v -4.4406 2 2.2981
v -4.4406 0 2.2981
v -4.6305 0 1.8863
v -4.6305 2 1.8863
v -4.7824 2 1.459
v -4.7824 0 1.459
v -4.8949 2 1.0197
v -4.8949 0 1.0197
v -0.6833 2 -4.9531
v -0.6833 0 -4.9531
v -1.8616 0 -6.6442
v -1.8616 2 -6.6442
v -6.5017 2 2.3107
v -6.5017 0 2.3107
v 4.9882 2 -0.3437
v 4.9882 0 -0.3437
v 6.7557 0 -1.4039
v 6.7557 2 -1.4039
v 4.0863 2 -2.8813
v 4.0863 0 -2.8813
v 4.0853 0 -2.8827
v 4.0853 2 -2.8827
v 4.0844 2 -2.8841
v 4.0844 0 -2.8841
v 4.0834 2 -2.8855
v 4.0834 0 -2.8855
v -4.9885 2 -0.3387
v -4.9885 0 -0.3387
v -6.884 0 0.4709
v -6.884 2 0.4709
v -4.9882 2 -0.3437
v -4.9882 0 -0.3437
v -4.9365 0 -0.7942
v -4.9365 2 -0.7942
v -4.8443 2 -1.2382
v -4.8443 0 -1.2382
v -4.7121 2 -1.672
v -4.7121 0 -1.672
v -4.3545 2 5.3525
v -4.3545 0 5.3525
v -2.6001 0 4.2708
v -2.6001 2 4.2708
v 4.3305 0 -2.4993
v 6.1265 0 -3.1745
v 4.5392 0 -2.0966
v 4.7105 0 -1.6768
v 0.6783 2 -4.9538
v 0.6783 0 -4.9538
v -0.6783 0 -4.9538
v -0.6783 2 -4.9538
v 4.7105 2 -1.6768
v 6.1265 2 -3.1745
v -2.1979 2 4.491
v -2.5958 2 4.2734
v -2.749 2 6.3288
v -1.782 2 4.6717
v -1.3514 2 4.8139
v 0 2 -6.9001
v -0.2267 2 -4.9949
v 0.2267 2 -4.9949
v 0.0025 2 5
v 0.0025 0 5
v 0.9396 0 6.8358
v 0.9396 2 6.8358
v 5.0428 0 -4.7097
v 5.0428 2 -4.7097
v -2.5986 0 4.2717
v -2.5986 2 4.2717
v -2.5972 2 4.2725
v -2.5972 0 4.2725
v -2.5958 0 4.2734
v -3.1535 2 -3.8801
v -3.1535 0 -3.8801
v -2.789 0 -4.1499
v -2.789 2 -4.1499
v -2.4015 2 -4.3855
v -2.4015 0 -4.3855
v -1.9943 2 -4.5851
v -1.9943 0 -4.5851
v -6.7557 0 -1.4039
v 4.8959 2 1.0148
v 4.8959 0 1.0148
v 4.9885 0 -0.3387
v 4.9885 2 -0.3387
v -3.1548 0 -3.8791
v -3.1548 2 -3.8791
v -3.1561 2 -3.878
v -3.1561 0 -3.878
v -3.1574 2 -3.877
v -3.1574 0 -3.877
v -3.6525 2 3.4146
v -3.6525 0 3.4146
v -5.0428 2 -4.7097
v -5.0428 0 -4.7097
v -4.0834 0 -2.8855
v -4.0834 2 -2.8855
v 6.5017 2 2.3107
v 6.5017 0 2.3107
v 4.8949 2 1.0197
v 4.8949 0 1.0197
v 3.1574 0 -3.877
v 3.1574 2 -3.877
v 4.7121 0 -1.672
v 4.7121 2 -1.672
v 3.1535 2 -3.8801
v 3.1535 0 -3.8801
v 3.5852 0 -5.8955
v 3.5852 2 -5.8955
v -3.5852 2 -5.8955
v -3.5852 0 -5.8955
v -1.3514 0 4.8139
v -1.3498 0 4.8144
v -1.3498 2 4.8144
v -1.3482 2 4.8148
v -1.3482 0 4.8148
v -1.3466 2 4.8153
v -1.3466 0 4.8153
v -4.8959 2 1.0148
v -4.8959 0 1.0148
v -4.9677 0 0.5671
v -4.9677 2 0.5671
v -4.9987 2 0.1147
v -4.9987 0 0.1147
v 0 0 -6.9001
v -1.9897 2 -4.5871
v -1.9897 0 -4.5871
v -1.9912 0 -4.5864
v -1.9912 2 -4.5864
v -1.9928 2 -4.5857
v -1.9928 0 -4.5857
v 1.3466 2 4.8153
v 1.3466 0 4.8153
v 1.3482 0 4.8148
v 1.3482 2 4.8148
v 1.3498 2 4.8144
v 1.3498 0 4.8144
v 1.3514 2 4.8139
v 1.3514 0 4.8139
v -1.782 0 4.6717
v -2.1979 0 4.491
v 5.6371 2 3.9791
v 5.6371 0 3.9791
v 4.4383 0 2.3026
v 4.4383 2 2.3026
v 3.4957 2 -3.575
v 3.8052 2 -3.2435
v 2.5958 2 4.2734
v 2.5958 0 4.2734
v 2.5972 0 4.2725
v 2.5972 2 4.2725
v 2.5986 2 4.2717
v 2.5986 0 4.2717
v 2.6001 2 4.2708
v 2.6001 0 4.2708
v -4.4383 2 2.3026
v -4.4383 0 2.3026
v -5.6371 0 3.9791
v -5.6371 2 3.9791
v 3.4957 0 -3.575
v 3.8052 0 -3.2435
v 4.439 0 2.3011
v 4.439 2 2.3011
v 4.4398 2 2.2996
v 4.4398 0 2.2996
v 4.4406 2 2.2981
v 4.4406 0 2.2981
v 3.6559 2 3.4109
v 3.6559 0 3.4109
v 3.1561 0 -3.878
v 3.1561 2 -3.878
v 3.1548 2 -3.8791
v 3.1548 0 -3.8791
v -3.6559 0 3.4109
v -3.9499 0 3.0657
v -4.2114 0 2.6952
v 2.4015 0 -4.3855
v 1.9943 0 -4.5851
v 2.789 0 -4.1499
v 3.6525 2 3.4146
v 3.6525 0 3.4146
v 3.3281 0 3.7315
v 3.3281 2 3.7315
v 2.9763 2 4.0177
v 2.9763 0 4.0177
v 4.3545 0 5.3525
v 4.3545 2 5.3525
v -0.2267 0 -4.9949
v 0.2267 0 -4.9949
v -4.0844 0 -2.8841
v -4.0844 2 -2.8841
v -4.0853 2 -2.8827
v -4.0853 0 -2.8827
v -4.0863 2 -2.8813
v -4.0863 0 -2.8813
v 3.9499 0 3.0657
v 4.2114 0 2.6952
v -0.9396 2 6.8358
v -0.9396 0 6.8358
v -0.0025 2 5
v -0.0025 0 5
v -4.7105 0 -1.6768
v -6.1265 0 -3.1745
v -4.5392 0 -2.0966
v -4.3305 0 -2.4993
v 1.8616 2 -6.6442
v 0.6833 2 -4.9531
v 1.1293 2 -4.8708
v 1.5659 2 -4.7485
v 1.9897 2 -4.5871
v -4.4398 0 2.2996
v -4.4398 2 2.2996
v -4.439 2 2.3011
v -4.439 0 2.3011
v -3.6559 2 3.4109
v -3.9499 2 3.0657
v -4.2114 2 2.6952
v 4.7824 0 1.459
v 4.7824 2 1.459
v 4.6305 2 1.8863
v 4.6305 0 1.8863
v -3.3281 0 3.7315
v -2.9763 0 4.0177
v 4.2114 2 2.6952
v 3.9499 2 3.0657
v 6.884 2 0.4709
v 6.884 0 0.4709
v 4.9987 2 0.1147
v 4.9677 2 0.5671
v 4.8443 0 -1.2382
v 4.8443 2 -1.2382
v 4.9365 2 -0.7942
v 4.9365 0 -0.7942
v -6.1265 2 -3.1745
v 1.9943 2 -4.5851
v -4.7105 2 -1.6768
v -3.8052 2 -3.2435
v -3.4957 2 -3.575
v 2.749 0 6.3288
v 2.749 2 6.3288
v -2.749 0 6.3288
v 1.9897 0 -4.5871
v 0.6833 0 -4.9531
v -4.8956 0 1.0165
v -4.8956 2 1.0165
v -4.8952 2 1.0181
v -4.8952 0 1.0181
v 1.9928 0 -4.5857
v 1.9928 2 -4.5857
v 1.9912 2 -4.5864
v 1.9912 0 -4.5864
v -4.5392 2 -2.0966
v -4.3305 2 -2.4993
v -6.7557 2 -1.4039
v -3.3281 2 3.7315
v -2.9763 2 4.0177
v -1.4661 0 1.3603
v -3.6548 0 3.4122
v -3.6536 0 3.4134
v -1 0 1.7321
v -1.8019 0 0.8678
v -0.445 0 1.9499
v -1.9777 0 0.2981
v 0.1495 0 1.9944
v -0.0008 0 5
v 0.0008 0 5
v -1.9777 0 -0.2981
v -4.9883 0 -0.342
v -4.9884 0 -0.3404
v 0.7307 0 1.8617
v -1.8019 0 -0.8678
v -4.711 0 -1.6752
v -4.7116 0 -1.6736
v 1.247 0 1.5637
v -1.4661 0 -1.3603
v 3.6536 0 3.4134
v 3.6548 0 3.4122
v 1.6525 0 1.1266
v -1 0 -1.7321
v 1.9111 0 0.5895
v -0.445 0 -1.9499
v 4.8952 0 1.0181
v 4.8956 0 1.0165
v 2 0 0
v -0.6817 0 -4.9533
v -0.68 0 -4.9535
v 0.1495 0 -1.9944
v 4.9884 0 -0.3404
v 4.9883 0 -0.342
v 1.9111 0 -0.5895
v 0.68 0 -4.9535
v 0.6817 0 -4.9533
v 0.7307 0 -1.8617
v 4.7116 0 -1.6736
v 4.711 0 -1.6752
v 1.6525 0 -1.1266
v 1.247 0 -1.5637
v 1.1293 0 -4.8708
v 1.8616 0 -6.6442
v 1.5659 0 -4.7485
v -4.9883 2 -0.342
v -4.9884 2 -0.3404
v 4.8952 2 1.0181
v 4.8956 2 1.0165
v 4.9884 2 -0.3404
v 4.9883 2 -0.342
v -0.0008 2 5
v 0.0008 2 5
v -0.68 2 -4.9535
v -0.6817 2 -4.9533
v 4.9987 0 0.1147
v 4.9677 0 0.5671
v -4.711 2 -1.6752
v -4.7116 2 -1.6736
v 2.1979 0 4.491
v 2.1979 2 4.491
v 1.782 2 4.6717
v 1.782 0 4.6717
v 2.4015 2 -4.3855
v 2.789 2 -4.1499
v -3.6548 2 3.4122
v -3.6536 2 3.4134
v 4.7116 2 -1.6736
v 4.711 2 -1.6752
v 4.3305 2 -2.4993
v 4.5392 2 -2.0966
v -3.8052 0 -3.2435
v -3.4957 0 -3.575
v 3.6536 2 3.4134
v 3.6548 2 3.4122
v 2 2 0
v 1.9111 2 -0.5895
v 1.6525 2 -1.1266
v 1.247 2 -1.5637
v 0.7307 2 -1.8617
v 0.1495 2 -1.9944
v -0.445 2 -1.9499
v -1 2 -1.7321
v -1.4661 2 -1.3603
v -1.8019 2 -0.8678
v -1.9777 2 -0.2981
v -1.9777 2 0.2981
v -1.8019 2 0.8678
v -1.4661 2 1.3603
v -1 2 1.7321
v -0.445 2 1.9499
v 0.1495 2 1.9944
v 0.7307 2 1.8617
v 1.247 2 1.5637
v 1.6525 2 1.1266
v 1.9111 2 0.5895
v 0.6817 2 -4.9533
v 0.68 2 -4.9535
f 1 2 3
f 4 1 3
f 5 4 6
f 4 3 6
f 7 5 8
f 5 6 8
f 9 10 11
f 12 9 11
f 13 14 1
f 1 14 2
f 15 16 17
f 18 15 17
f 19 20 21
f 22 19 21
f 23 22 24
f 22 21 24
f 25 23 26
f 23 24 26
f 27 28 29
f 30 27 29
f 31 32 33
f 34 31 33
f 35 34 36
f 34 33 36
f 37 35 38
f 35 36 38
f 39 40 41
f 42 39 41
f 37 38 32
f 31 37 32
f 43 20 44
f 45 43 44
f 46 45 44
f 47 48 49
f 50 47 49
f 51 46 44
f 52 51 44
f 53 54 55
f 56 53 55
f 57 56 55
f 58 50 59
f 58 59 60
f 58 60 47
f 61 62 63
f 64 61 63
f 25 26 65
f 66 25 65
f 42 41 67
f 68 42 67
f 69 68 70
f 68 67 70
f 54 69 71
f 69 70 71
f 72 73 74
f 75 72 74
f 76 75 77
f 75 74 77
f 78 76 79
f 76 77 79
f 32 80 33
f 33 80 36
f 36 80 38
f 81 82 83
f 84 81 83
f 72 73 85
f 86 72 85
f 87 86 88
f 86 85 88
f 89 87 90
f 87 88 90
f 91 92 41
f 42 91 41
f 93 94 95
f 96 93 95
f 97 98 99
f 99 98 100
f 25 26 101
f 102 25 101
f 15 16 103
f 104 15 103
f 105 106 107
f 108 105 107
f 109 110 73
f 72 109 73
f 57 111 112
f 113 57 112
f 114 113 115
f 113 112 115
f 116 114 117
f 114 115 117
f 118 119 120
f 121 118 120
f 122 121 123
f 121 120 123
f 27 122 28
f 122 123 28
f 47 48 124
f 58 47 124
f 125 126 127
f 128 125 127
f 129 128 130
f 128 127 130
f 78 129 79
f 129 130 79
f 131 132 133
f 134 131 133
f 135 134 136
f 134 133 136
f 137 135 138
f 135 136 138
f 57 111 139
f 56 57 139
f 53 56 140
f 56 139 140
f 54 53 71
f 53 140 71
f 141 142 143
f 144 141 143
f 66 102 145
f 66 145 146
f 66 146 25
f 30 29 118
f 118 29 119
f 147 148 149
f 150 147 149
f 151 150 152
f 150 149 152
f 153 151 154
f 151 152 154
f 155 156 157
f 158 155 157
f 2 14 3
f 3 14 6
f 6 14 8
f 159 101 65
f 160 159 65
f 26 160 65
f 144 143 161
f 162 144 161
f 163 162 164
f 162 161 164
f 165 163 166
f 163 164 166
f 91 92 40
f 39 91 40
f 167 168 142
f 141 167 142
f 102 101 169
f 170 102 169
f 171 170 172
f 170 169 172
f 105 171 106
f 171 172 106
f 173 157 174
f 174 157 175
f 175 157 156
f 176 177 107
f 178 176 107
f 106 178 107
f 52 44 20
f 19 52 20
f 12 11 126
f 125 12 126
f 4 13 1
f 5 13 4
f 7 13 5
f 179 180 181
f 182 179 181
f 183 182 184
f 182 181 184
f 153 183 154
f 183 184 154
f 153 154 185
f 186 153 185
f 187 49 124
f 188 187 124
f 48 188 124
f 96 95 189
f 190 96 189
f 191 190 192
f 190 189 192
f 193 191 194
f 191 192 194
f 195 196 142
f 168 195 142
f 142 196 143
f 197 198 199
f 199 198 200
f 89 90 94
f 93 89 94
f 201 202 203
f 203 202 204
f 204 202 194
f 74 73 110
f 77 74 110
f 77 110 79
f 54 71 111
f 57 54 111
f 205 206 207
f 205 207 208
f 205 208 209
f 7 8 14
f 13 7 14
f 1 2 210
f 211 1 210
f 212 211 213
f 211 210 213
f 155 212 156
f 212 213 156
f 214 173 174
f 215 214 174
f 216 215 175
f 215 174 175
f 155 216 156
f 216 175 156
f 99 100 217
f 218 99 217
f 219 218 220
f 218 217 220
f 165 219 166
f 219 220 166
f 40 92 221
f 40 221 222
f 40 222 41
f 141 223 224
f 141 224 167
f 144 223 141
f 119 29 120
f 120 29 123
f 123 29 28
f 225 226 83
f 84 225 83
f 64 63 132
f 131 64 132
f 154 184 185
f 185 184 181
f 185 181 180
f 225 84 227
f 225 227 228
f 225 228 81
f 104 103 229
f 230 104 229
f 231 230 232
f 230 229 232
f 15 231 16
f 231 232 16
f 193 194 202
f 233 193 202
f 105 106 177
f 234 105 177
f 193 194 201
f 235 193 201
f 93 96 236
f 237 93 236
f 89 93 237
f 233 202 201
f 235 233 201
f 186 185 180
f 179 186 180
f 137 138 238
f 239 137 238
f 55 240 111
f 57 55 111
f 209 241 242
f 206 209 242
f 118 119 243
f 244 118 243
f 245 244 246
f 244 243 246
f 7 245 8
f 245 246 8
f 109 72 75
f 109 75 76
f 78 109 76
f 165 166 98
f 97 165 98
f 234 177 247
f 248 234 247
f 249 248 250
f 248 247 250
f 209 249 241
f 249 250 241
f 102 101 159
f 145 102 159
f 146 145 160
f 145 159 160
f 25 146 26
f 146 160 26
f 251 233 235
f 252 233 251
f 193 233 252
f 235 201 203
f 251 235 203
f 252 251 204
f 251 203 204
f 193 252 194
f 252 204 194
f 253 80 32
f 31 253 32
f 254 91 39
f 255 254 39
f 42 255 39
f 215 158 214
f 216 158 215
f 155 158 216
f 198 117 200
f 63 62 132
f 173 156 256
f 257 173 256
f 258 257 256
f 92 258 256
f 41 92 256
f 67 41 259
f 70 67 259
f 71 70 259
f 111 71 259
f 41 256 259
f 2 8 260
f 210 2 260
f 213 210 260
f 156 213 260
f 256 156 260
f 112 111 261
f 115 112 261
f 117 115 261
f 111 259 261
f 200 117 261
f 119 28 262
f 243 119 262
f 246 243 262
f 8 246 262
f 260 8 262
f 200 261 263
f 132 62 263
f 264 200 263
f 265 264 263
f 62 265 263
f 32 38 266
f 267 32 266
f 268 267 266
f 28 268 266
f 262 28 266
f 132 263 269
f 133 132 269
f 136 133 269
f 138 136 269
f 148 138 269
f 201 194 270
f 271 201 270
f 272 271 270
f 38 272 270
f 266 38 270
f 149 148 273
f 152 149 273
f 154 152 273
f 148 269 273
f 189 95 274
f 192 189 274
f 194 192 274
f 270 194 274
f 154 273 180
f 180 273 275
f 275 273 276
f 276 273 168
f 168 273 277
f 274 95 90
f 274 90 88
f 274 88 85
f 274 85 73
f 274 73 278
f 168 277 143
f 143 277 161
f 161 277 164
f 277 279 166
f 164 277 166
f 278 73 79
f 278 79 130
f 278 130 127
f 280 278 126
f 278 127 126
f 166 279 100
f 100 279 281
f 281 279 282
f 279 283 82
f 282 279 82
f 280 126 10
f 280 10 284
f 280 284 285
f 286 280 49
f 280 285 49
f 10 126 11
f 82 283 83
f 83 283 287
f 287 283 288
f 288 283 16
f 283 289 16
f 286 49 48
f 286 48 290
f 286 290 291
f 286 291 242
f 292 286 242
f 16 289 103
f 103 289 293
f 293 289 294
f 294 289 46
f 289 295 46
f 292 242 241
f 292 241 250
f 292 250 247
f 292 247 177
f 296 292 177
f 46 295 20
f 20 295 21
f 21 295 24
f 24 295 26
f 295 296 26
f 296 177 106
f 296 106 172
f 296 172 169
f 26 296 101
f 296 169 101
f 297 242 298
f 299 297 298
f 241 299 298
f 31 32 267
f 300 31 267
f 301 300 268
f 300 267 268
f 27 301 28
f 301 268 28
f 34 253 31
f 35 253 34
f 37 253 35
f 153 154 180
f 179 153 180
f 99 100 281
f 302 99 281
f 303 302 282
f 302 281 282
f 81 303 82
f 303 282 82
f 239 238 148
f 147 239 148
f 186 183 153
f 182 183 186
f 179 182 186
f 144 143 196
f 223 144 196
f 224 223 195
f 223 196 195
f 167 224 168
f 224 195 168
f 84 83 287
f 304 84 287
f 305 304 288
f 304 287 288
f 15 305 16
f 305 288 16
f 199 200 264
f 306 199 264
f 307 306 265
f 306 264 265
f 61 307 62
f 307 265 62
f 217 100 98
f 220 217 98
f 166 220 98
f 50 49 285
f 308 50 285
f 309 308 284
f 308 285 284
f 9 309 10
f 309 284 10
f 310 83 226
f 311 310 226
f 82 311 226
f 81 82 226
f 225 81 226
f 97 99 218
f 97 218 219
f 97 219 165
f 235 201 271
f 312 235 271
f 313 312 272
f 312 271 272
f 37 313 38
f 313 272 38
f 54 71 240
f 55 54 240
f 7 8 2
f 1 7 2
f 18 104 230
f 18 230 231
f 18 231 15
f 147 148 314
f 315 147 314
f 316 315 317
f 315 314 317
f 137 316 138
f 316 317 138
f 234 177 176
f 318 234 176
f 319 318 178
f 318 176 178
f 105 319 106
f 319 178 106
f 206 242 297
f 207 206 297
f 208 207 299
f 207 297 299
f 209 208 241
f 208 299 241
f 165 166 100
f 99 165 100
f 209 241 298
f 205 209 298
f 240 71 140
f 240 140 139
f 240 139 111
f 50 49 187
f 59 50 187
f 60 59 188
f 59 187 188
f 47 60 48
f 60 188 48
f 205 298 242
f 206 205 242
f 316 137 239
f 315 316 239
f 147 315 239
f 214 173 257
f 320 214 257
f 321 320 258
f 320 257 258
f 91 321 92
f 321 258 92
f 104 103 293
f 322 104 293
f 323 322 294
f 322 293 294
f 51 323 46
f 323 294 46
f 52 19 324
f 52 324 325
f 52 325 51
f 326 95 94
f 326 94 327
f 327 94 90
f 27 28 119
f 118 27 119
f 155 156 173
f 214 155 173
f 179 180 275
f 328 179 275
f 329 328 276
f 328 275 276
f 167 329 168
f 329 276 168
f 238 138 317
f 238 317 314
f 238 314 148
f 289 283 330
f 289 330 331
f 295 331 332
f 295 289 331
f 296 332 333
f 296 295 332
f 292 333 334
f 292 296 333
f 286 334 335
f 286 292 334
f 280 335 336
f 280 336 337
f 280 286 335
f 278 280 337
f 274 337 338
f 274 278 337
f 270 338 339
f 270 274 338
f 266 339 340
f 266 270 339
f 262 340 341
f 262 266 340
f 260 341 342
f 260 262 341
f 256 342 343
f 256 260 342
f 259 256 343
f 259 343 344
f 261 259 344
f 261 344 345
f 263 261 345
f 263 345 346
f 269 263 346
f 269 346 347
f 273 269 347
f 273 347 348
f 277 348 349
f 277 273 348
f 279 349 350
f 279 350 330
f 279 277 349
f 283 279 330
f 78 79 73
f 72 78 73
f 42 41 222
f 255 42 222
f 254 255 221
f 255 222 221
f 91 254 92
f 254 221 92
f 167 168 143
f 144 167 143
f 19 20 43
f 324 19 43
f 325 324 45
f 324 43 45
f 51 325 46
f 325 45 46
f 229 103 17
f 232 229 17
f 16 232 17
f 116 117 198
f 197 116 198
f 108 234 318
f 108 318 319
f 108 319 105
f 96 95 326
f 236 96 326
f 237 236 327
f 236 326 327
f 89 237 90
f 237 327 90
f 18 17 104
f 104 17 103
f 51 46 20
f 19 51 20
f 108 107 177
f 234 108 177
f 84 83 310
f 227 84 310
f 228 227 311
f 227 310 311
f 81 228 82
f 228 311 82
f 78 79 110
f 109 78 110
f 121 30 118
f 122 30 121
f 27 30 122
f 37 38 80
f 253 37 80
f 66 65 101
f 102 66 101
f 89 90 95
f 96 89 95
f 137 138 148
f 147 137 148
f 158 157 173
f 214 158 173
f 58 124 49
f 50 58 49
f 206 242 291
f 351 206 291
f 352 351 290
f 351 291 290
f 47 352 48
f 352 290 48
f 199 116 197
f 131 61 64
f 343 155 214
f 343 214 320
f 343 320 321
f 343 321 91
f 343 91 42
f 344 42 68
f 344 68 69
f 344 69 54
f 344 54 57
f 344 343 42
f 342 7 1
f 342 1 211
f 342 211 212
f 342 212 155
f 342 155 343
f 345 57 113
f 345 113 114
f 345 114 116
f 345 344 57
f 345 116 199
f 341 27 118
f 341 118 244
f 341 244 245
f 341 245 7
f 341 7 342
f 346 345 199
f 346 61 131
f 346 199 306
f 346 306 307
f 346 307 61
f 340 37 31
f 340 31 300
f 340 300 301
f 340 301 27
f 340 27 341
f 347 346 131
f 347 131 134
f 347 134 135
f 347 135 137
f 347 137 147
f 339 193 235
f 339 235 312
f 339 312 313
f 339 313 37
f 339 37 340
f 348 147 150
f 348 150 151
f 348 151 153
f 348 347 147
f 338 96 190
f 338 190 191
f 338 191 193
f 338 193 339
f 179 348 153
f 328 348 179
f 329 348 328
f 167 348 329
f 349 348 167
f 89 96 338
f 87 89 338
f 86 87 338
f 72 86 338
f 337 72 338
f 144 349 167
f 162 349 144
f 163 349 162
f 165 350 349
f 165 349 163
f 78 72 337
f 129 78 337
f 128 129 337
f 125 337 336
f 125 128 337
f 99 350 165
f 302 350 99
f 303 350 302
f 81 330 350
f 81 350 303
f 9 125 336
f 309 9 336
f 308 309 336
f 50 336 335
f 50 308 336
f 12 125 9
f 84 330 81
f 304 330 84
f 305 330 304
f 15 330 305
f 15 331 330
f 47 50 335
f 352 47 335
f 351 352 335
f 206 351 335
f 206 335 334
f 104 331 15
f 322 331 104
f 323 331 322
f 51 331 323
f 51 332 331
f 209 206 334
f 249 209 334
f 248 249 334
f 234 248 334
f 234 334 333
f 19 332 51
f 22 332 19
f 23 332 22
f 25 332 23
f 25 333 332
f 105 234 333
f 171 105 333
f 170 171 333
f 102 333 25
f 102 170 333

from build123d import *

# Parameters (mm, degrees)
BOSS_EXTRUDE1_DEPTH    = 2
SKETCH1_R              = 2
BOSS_EXTRUDE1_2_DEPTH  = 2
BOSS_EXTRUDE1_3_DEPTH  = 2
BOSS_EXTRUDE1_4_DEPTH  = 2
BOSS_EXTRUDE1_5_DEPTH  = 2
BOSS_EXTRUDE1_6_DEPTH  = 2
BOSS_EXTRUDE1_7_DEPTH  = 2
BOSS_EXTRUDE1_8_DEPTH  = 2
BOSS_EXTRUDE1_9_DEPTH  = 2
BOSS_EXTRUDE1_10_DEPTH = 2
BOSS_EXTRUDE1_11_DEPTH = 2
BOSS_EXTRUDE1_12_DEPTH = 2
BOSS_EXTRUDE1_13_DEPTH = 2
BOSS_EXTRUDE1_14_DEPTH = 2
BOSS_EXTRUDE1_15_DEPTH = 2
BOSS_EXTRUDE1_16_DEPTH = 2
BOSS_EXTRUDE1_17_DEPTH = 2
BOSS_EXTRUDE1_18_DEPTH = 2
BOSS_EXTRUDE1_19_DEPTH = 2
BOSS_EXTRUDE1_20_DEPTH = 2
BOSS_EXTRUDE1_21_DEPTH = 2


with BuildPart() as part:
    # Sketch1 → Boss-Extrude1 (new body)
    with BuildSketch(Plane(origin=(0, 0, 0), x_dir=(1, 0, 0), z_dir=(0, 1, 0))):
        with BuildLine():
            ThreePointArc((-0.678341052, 4.953771636), (0, 5), (0.678341052, 4.953771636))
            Line((0.678341052, 4.953771636), (0, 6.900057726))
            Line((0, 6.900057726), (-0.678341052, 4.953771636))
        make_face()
    extrude(amount=BOSS_EXTRUDE1_DEPTH)


with BuildPart() as body_2:
    # Sketch1 → Boss-Extrude1 2 (new body)
    with BuildSketch(Plane(origin=(0, 0, 0), x_dir=(1, 0, 0), z_dir=(0, 1, 0))):
        with BuildLine():
            ThreePointArc((0.683325267, 4.953086571), (0.680833245, 4.95342973), (0.678341052, 4.953771636))
            Line((0.678341052, 4.953771636), (-0.678341052, 4.953771636))
            ThreePointArc((-0.678341052, 4.953771636), (-0.680833245, 4.95342973), (-0.683325267, 4.953086571))
            Line((-0.683325267, 4.953086571), (-1.861613295, 6.644184868))
            Line((-1.861613295, 6.644184868), (-1.989697918, 4.58705812))
            ThreePointArc((-1.989697918, 4.58705812), (-1.992005449, 4.586056508), (-1.994312476, 4.585053734))
            Line((-1.994312476, 4.585053734), (-3.153487992, 3.880143488))
            ThreePointArc((-3.153487992, 3.880143488), (-3.155439722, 3.878556454), (-3.157390653, 3.876968437))
            Line((-3.157390653, 3.876968437), (-4.083398287, 2.885456364))
            ThreePointArc((-4.083398287, 2.885456364), (-4.084849465, 2.883401611), (-4.086299609, 2.881346127))
            Line((-4.086299609, 2.881346127), (-4.710461612, 1.676768141))
            ThreePointArc((-4.710461612, 1.676768141), (-4.711304611, 1.674398061), (-4.712146416, 1.672027556))
            Line((-4.712146416, 1.672027556), (-4.988171548, 0.343721697))
            ThreePointArc((-4.988171548, 0.343721697), (-4.988343846, 0.341212067), (-4.988514881, 0.338702351))
            Line((-4.988514881, 0.338702351), (-4.89593162, -1.014817014))
            ThreePointArc((-4.89593162, -1.014817014), (-4.895420438, -1.017280065), (-4.894908018, -1.019742859))
            Line((-4.894908018, -1.019742859), (-4.440582841, -2.298091389))
            ThreePointArc((-4.440582841, -2.298091389), (-4.439426092, -2.300325189), (-4.438268219, -2.302558406))
            Line((-4.438268219, -2.302558406), (-3.655896347, -3.410926839))
            ThreePointArc((-3.655896347, -3.410926839), (-3.654179821, -3.412765716), (-3.652462371, -3.414603729))
            Line((-3.652462371, -3.414603729), (-2.600068745, -4.270789449))
            ThreePointArc((-2.600068745, -4.270789449), (-2.59791975, -4.272097023), (-2.595770098, -4.273403515))
            Line((-2.595770098, -4.273403515), (-1.351405939, -4.813907144))
            ThreePointArc((-1.351405939, -4.813907144), (-1.348983856, -4.814586437), (-1.346561431, -4.815264511))
            Line((-1.346561431, -4.815264511), (-0.939557739, -6.835790216))
            Line((-0.939557739, -6.835790216), (-0.002515537, -4.999999367))
            ThreePointArc((-0.002515537, -4.999999367), (0, -5), (0.002515537, -4.999999367))
            Line((0.002515537, -4.999999367), (0.939557739, -6.835790216))
            Line((0.939557739, -6.835790216), (1.346561431, -4.815264511))
            ThreePointArc((1.346561431, -4.815264511), (1.348983856, -4.814586437), (1.351405939, -4.813907144))
            Line((1.351405939, -4.813907144), (2.595770098, -4.273403515))
            ThreePointArc((2.595770098, -4.273403515), (2.59791975, -4.272097023), (2.600068745, -4.270789449))
            Line((2.600068745, -4.270789449), (3.652462371, -3.414603729))
            ThreePointArc((3.652462371, -3.414603729), (3.654179821, -3.412765716), (3.655896347, -3.410926839))
            Line((3.655896347, -3.410926839), (4.438268219, -2.302558406))
            ThreePointArc((4.438268219, -2.302558406), (4.439426092, -2.300325189), (4.440582841, -2.298091389))
            Line((4.440582841, -2.298091389), (4.894908018, -1.019742859))
            ThreePointArc((4.894908018, -1.019742859), (4.895420438, -1.017280065), (4.89593162, -1.014817014))
            Line((4.89593162, -1.014817014), (4.988514881, 0.338702351))
            ThreePointArc((4.988514881, 0.338702351), (4.988343846, 0.341212067), (4.988171548, 0.343721697))
            Line((4.988171548, 0.343721697), (4.712146416, 1.672027556))
            ThreePointArc((4.712146416, 1.672027556), (4.711304611, 1.674398061), (4.710461612, 1.676768141))
            Line((4.710461612, 1.676768141), (4.086299609, 2.881346127))
            ThreePointArc((4.086299609, 2.881346127), (4.084849465, 2.883401611), (4.083398287, 2.885456364))
            Line((4.083398287, 2.885456364), (3.157390653, 3.876968437))
            ThreePointArc((3.157390653, 3.876968437), (3.155439722, 3.878556454), (3.153487992, 3.880143488))
            Line((3.153487992, 3.880143488), (1.994312476, 4.585053734))
            ThreePointArc((1.994312476, 4.585053734), (1.992005449, 4.586056508), (1.989697918, 4.58705812))
            Line((1.989697918, 4.58705812), (0.683325267, 4.953086571))
        make_face()
        Circle(SKETCH1_R, mode=Mode.SUBTRACT)
    extrude(amount=BOSS_EXTRUDE1_2_DEPTH)


with BuildPart() as body_3:
    # Sketch1 → Boss-Extrude1 3 (new body)
    with BuildSketch(Plane(origin=(0, 0, 0), x_dir=(1, 0, 0), z_dir=(0, 1, 0))):
        with BuildLine():
            Line((1.861613295, 6.644184868), (0.683325267, 4.953086571))
            ThreePointArc((0.683325267, 4.953086571), (1.348983856, 4.814586437), (1.989697918, 4.58705812))
            Line((1.989697918, 4.58705812), (1.861613295, 6.644184868))
        make_face()
    extrude(amount=BOSS_EXTRUDE1_3_DEPTH)


with BuildPart() as body_4:
    # Sketch1 → Boss-Extrude1 4 (new body)
    with BuildSketch(Plane(origin=(0, 0, 0), x_dir=(1, 0, 0), z_dir=(0, 1, 0))):
        with BuildLine():
            Line((3.585159249, 5.895543213), (1.994312476, 4.585053734))
            ThreePointArc((1.994312476, 4.585053734), (2.59791975, 4.272097023), (3.153487992, 3.880143488))
            Line((3.153487992, 3.880143488), (3.585159249, 5.895543213))
        make_face()
    extrude(amount=BOSS_EXTRUDE1_4_DEPTH)


with BuildPart() as body_5:
    # Sketch1 → Boss-Extrude1 5 (new body)
    with BuildSketch(Plane(origin=(0, 0, 0), x_dir=(1, 0, 0), z_dir=(0, 1, 0))):
        with BuildLine():
            ThreePointArc((-3.153487992, 3.880143488), (-2.59791975, 4.272097023), (-1.994312476, 4.585053734))
            Line((-1.994312476, 4.585053734), (-3.585159249, 5.895543213))
            Line((-3.585159249, 5.895543213), (-3.153487992, 3.880143488))
        make_face()
    extrude(amount=BOSS_EXTRUDE1_5_DEPTH)


with BuildPart() as body_6:
    # Sketch1 → Boss-Extrude1 6 (new body)
    with BuildSketch(Plane(origin=(0, 0, 0), x_dir=(1, 0, 0), z_dir=(0, 1, 0))):
        with BuildLine():
            Line((5.042810342, 4.709656089), (3.157390653, 3.876968437))
            ThreePointArc((3.157390653, 3.876968437), (3.654179821, 3.412765716), (4.083398287, 2.885456364))
            Line((4.083398287, 2.885456364), (5.042810342, 4.709656089))
        make_face()
    extrude(amount=BOSS_EXTRUDE1_6_DEPTH)


with BuildPart() as body_7:
    # Sketch1 → Boss-Extrude1 7 (new body)
    with BuildSketch(Plane(origin=(0, 0, 0), x_dir=(1, 0, 0), z_dir=(0, 1, 0))):
        with BuildLine():
            ThreePointArc((-4.083398287, 2.885456364), (-3.654179821, 3.412765716), (-3.157390653, 3.876968437))
            Line((-3.157390653, 3.876968437), (-5.042810342, 4.709656089))
            Line((-5.042810342, 4.709656089), (-4.083398287, 2.885456364))
        make_face()
    extrude(amount=BOSS_EXTRUDE1_7_DEPTH)


with BuildPart() as body_8:
    # Sketch1 → Boss-Extrude1 8 (new body)
    with BuildSketch(Plane(origin=(0, 0, 0), x_dir=(1, 0, 0), z_dir=(0, 1, 0))):
        with BuildLine():
            Line((6.126459261, 3.174475318), (4.086299609, 2.881346127))
            ThreePointArc((4.086299609, 2.881346127), (4.439426092, 2.300325189), (4.710461612, 1.676768141))
            Line((4.710461612, 1.676768141), (6.126459261, 3.174475318))
        make_face()
    extrude(amount=BOSS_EXTRUDE1_8_DEPTH)


with BuildPart() as body_9:
    # Sketch1 → Boss-Extrude1 9 (new body)
    with BuildSketch(Plane(origin=(0, 0, 0), x_dir=(1, 0, 0), z_dir=(0, 1, 0))):
        with BuildLine():
            ThreePointArc((-4.710461612, 1.676768141), (-4.439426092, 2.300325189), (-4.086299609, 2.881346127))
            Line((-4.086299609, 2.881346127), (-6.126459261, 3.174475318))
            Line((-6.126459261, 3.174475318), (-4.710461612, 1.676768141))
        make_face()
    extrude(amount=BOSS_EXTRUDE1_9_DEPTH)


with BuildPart() as body_10:
    # Sketch1 → Boss-Extrude1 10 (new body)
    with BuildSketch(Plane(origin=(0, 0, 0), x_dir=(1, 0, 0), z_dir=(0, 1, 0))):
        with BuildLine():
            Line((6.755736723, 1.403858235), (4.712146416, 1.672027556))
            ThreePointArc((4.712146416, 1.672027556), (4.895420438, 1.017280065), (4.988171548, 0.343721697))
            Line((4.988171548, 0.343721697), (6.755736723, 1.403858235))
        make_face()
    extrude(amount=BOSS_EXTRUDE1_10_DEPTH)


with BuildPart() as body_11:
    # Sketch1 → Boss-Extrude1 11 (new body)
    with BuildSketch(Plane(origin=(0, 0, 0), x_dir=(1, 0, 0), z_dir=(0, 1, 0))):
        with BuildLine():
            ThreePointArc((-4.988171548, 0.343721697), (-4.895420438, 1.017280065), (-4.712146416, 1.672027556))
            Line((-4.712146416, 1.672027556), (-6.755736723, 1.403858235))
            Line((-6.755736723, 1.403858235), (-4.988171548, 0.343721697))
        make_face()
    extrude(amount=BOSS_EXTRUDE1_11_DEPTH)


with BuildPart() as body_12:
    # Sketch1 → Boss-Extrude1 12 (new body)
    with BuildSketch(Plane(origin=(0, 0, 0), x_dir=(1, 0, 0), z_dir=(0, 1, 0))):
        with BuildLine():
            Line((6.883972099, -0.470876592), (4.988514881, 0.338702351))
            ThreePointArc((4.988514881, 0.338702351), (4.988343846, -0.341212067), (4.89593162, -1.014817014))
            Line((4.89593162, -1.014817014), (6.883972099, -0.470876592))
        make_face()
    extrude(amount=BOSS_EXTRUDE1_12_DEPTH)


with BuildPart() as body_13:
    # Sketch1 → Boss-Extrude1 13 (new body)
    with BuildSketch(Plane(origin=(0, 0, 0), x_dir=(1, 0, 0), z_dir=(0, 1, 0))):
        with BuildLine():
            ThreePointArc((-4.89593162, -1.014817014), (-4.988343846, -0.341212067), (-4.988514881, 0.338702351))
            Line((-4.988514881, 0.338702351), (-6.883972099, -0.470876592))
            Line((-6.883972099, -0.470876592), (-4.89593162, -1.014817014))
        make_face()
    extrude(amount=BOSS_EXTRUDE1_13_DEPTH)


with BuildPart() as body_14:
    # Sketch1 → Boss-Extrude1 14 (new body)
    with BuildSketch(Plane(origin=(0, 0, 0), x_dir=(1, 0, 0), z_dir=(0, 1, 0))):
        with BuildLine():
            Line((6.501654755, -2.310688655), (4.894908018, -1.019742859))
            ThreePointArc((4.894908018, -1.019742859), (4.711304611, -1.674398061), (4.440582841, -2.298091389))
            Line((4.440582841, -2.298091389), (6.501654755, -2.310688655))
        make_face()
    extrude(amount=BOSS_EXTRUDE1_14_DEPTH)


with BuildPart() as body_15:
    # Sketch1 → Boss-Extrude1 15 (new body)
    with BuildSketch(Plane(origin=(0, 0, 0), x_dir=(1, 0, 0), z_dir=(0, 1, 0))):
        with BuildLine():
            ThreePointArc((-4.440582841, -2.298091389), (-4.711304611, -1.674398061), (-4.894908018, -1.019742859))
            Line((-4.894908018, -1.019742859), (-6.501654755, -2.310688655))
            Line((-6.501654755, -2.310688655), (-4.440582841, -2.298091389))
        make_face()
    extrude(amount=BOSS_EXTRUDE1_15_DEPTH)


with BuildPart() as body_16:
    # Sketch1 → Boss-Extrude1 16 (new body)
    with BuildSketch(Plane(origin=(0, 0, 0), x_dir=(1, 0, 0), z_dir=(0, 1, 0))):
        with BuildLine():
            Line((5.637139422, -3.979127512), (4.438268219, -2.302558406))
            ThreePointArc((4.438268219, -2.302558406), (4.084849465, -2.883401611), (3.655896347, -3.410926839))
            Line((3.655896347, -3.410926839), (5.637139422, -3.979127512))
        make_face()
    extrude(amount=BOSS_EXTRUDE1_16_DEPTH)


with BuildPart() as body_17:
    # Sketch1 → Boss-Extrude1 17 (new body)
    with BuildSketch(Plane(origin=(0, 0, 0), x_dir=(1, 0, 0), z_dir=(0, 1, 0))):
        with BuildLine():
            ThreePointArc((-3.655896347, -3.410926839), (-4.084849465, -2.883401611), (-4.438268219, -2.302558406))
            Line((-4.438268219, -2.302558406), (-5.637139422, -3.979127512))
            Line((-5.637139422, -3.979127512), (-3.655896347, -3.410926839))
        make_face()
    extrude(amount=BOSS_EXTRUDE1_17_DEPTH)


with BuildPart() as body_18:
    # Sketch1 → Boss-Extrude1 18 (new body)
    with BuildSketch(Plane(origin=(0, 0, 0), x_dir=(1, 0, 0), z_dir=(0, 1, 0))):
        with BuildLine():
            Line((4.354543246, -5.352452684), (3.652462371, -3.414603729))
            ThreePointArc((3.652462371, -3.414603729), (3.155439722, -3.878556454), (2.600068745, -4.270789449))
            Line((2.600068745, -4.270789449), (4.354543246, -5.352452684))
        make_face()
    extrude(amount=BOSS_EXTRUDE1_18_DEPTH)


with BuildPart() as body_19:
    # Sketch1 → Boss-Extrude1 19 (new body)
    with BuildSketch(Plane(origin=(0, 0, 0), x_dir=(1, 0, 0), z_dir=(0, 1, 0))):
        with BuildLine():
            ThreePointArc((-2.600068745, -4.270789449), (-3.155439722, -3.878556454), (-3.652462371, -3.414603729))
            Line((-3.652462371, -3.414603729), (-4.354543246, -5.352452684))
            Line((-4.354543246, -5.352452684), (-2.600068745, -4.270789449))
        make_face()
    extrude(amount=BOSS_EXTRUDE1_19_DEPTH)


with BuildPart() as body_20:
    # Sketch1 → Boss-Extrude1 20 (new body)
    with BuildSketch(Plane(origin=(0, 0, 0), x_dir=(1, 0, 0), z_dir=(0, 1, 0))):
        with BuildLine():
            Line((2.748990518, -6.328810927), (2.595770098, -4.273403515))
            ThreePointArc((2.595770098, -4.273403515), (1.992005449, -4.586056508), (1.351405939, -4.813907144))
            Line((1.351405939, -4.813907144), (2.748990518, -6.328810927))
        make_face()
    extrude(amount=BOSS_EXTRUDE1_20_DEPTH)


with BuildPart() as body_21:
    # Sketch1 → Boss-Extrude1 21 (new body)
    with BuildSketch(Plane(origin=(0, 0, 0), x_dir=(1, 0, 0), z_dir=(0, 1, 0))):
        with BuildLine():
            ThreePointArc((-1.351405939, -4.813907144), (-1.992005449, -4.586056508), (-2.595770098, -4.273403515))
            Line((-2.595770098, -4.273403515), (-2.748990518, -6.328810927))
            Line((-2.748990518, -6.328810927), (-1.351405939, -4.813907144))
        make_face()
    extrude(amount=BOSS_EXTRUDE1_21_DEPTH)


solid = Compound([part.part, body_2.part, body_3.part, body_4.part, body_5.part, body_6.part, body_7.part, body_8.part, body_9.part, body_10.part, body_11.part, body_12.part, body_13.part, body_14.part, body_15.part, body_16.part, body_17.part, body_18.part, body_19.part, body_20.part, body_21.part])
